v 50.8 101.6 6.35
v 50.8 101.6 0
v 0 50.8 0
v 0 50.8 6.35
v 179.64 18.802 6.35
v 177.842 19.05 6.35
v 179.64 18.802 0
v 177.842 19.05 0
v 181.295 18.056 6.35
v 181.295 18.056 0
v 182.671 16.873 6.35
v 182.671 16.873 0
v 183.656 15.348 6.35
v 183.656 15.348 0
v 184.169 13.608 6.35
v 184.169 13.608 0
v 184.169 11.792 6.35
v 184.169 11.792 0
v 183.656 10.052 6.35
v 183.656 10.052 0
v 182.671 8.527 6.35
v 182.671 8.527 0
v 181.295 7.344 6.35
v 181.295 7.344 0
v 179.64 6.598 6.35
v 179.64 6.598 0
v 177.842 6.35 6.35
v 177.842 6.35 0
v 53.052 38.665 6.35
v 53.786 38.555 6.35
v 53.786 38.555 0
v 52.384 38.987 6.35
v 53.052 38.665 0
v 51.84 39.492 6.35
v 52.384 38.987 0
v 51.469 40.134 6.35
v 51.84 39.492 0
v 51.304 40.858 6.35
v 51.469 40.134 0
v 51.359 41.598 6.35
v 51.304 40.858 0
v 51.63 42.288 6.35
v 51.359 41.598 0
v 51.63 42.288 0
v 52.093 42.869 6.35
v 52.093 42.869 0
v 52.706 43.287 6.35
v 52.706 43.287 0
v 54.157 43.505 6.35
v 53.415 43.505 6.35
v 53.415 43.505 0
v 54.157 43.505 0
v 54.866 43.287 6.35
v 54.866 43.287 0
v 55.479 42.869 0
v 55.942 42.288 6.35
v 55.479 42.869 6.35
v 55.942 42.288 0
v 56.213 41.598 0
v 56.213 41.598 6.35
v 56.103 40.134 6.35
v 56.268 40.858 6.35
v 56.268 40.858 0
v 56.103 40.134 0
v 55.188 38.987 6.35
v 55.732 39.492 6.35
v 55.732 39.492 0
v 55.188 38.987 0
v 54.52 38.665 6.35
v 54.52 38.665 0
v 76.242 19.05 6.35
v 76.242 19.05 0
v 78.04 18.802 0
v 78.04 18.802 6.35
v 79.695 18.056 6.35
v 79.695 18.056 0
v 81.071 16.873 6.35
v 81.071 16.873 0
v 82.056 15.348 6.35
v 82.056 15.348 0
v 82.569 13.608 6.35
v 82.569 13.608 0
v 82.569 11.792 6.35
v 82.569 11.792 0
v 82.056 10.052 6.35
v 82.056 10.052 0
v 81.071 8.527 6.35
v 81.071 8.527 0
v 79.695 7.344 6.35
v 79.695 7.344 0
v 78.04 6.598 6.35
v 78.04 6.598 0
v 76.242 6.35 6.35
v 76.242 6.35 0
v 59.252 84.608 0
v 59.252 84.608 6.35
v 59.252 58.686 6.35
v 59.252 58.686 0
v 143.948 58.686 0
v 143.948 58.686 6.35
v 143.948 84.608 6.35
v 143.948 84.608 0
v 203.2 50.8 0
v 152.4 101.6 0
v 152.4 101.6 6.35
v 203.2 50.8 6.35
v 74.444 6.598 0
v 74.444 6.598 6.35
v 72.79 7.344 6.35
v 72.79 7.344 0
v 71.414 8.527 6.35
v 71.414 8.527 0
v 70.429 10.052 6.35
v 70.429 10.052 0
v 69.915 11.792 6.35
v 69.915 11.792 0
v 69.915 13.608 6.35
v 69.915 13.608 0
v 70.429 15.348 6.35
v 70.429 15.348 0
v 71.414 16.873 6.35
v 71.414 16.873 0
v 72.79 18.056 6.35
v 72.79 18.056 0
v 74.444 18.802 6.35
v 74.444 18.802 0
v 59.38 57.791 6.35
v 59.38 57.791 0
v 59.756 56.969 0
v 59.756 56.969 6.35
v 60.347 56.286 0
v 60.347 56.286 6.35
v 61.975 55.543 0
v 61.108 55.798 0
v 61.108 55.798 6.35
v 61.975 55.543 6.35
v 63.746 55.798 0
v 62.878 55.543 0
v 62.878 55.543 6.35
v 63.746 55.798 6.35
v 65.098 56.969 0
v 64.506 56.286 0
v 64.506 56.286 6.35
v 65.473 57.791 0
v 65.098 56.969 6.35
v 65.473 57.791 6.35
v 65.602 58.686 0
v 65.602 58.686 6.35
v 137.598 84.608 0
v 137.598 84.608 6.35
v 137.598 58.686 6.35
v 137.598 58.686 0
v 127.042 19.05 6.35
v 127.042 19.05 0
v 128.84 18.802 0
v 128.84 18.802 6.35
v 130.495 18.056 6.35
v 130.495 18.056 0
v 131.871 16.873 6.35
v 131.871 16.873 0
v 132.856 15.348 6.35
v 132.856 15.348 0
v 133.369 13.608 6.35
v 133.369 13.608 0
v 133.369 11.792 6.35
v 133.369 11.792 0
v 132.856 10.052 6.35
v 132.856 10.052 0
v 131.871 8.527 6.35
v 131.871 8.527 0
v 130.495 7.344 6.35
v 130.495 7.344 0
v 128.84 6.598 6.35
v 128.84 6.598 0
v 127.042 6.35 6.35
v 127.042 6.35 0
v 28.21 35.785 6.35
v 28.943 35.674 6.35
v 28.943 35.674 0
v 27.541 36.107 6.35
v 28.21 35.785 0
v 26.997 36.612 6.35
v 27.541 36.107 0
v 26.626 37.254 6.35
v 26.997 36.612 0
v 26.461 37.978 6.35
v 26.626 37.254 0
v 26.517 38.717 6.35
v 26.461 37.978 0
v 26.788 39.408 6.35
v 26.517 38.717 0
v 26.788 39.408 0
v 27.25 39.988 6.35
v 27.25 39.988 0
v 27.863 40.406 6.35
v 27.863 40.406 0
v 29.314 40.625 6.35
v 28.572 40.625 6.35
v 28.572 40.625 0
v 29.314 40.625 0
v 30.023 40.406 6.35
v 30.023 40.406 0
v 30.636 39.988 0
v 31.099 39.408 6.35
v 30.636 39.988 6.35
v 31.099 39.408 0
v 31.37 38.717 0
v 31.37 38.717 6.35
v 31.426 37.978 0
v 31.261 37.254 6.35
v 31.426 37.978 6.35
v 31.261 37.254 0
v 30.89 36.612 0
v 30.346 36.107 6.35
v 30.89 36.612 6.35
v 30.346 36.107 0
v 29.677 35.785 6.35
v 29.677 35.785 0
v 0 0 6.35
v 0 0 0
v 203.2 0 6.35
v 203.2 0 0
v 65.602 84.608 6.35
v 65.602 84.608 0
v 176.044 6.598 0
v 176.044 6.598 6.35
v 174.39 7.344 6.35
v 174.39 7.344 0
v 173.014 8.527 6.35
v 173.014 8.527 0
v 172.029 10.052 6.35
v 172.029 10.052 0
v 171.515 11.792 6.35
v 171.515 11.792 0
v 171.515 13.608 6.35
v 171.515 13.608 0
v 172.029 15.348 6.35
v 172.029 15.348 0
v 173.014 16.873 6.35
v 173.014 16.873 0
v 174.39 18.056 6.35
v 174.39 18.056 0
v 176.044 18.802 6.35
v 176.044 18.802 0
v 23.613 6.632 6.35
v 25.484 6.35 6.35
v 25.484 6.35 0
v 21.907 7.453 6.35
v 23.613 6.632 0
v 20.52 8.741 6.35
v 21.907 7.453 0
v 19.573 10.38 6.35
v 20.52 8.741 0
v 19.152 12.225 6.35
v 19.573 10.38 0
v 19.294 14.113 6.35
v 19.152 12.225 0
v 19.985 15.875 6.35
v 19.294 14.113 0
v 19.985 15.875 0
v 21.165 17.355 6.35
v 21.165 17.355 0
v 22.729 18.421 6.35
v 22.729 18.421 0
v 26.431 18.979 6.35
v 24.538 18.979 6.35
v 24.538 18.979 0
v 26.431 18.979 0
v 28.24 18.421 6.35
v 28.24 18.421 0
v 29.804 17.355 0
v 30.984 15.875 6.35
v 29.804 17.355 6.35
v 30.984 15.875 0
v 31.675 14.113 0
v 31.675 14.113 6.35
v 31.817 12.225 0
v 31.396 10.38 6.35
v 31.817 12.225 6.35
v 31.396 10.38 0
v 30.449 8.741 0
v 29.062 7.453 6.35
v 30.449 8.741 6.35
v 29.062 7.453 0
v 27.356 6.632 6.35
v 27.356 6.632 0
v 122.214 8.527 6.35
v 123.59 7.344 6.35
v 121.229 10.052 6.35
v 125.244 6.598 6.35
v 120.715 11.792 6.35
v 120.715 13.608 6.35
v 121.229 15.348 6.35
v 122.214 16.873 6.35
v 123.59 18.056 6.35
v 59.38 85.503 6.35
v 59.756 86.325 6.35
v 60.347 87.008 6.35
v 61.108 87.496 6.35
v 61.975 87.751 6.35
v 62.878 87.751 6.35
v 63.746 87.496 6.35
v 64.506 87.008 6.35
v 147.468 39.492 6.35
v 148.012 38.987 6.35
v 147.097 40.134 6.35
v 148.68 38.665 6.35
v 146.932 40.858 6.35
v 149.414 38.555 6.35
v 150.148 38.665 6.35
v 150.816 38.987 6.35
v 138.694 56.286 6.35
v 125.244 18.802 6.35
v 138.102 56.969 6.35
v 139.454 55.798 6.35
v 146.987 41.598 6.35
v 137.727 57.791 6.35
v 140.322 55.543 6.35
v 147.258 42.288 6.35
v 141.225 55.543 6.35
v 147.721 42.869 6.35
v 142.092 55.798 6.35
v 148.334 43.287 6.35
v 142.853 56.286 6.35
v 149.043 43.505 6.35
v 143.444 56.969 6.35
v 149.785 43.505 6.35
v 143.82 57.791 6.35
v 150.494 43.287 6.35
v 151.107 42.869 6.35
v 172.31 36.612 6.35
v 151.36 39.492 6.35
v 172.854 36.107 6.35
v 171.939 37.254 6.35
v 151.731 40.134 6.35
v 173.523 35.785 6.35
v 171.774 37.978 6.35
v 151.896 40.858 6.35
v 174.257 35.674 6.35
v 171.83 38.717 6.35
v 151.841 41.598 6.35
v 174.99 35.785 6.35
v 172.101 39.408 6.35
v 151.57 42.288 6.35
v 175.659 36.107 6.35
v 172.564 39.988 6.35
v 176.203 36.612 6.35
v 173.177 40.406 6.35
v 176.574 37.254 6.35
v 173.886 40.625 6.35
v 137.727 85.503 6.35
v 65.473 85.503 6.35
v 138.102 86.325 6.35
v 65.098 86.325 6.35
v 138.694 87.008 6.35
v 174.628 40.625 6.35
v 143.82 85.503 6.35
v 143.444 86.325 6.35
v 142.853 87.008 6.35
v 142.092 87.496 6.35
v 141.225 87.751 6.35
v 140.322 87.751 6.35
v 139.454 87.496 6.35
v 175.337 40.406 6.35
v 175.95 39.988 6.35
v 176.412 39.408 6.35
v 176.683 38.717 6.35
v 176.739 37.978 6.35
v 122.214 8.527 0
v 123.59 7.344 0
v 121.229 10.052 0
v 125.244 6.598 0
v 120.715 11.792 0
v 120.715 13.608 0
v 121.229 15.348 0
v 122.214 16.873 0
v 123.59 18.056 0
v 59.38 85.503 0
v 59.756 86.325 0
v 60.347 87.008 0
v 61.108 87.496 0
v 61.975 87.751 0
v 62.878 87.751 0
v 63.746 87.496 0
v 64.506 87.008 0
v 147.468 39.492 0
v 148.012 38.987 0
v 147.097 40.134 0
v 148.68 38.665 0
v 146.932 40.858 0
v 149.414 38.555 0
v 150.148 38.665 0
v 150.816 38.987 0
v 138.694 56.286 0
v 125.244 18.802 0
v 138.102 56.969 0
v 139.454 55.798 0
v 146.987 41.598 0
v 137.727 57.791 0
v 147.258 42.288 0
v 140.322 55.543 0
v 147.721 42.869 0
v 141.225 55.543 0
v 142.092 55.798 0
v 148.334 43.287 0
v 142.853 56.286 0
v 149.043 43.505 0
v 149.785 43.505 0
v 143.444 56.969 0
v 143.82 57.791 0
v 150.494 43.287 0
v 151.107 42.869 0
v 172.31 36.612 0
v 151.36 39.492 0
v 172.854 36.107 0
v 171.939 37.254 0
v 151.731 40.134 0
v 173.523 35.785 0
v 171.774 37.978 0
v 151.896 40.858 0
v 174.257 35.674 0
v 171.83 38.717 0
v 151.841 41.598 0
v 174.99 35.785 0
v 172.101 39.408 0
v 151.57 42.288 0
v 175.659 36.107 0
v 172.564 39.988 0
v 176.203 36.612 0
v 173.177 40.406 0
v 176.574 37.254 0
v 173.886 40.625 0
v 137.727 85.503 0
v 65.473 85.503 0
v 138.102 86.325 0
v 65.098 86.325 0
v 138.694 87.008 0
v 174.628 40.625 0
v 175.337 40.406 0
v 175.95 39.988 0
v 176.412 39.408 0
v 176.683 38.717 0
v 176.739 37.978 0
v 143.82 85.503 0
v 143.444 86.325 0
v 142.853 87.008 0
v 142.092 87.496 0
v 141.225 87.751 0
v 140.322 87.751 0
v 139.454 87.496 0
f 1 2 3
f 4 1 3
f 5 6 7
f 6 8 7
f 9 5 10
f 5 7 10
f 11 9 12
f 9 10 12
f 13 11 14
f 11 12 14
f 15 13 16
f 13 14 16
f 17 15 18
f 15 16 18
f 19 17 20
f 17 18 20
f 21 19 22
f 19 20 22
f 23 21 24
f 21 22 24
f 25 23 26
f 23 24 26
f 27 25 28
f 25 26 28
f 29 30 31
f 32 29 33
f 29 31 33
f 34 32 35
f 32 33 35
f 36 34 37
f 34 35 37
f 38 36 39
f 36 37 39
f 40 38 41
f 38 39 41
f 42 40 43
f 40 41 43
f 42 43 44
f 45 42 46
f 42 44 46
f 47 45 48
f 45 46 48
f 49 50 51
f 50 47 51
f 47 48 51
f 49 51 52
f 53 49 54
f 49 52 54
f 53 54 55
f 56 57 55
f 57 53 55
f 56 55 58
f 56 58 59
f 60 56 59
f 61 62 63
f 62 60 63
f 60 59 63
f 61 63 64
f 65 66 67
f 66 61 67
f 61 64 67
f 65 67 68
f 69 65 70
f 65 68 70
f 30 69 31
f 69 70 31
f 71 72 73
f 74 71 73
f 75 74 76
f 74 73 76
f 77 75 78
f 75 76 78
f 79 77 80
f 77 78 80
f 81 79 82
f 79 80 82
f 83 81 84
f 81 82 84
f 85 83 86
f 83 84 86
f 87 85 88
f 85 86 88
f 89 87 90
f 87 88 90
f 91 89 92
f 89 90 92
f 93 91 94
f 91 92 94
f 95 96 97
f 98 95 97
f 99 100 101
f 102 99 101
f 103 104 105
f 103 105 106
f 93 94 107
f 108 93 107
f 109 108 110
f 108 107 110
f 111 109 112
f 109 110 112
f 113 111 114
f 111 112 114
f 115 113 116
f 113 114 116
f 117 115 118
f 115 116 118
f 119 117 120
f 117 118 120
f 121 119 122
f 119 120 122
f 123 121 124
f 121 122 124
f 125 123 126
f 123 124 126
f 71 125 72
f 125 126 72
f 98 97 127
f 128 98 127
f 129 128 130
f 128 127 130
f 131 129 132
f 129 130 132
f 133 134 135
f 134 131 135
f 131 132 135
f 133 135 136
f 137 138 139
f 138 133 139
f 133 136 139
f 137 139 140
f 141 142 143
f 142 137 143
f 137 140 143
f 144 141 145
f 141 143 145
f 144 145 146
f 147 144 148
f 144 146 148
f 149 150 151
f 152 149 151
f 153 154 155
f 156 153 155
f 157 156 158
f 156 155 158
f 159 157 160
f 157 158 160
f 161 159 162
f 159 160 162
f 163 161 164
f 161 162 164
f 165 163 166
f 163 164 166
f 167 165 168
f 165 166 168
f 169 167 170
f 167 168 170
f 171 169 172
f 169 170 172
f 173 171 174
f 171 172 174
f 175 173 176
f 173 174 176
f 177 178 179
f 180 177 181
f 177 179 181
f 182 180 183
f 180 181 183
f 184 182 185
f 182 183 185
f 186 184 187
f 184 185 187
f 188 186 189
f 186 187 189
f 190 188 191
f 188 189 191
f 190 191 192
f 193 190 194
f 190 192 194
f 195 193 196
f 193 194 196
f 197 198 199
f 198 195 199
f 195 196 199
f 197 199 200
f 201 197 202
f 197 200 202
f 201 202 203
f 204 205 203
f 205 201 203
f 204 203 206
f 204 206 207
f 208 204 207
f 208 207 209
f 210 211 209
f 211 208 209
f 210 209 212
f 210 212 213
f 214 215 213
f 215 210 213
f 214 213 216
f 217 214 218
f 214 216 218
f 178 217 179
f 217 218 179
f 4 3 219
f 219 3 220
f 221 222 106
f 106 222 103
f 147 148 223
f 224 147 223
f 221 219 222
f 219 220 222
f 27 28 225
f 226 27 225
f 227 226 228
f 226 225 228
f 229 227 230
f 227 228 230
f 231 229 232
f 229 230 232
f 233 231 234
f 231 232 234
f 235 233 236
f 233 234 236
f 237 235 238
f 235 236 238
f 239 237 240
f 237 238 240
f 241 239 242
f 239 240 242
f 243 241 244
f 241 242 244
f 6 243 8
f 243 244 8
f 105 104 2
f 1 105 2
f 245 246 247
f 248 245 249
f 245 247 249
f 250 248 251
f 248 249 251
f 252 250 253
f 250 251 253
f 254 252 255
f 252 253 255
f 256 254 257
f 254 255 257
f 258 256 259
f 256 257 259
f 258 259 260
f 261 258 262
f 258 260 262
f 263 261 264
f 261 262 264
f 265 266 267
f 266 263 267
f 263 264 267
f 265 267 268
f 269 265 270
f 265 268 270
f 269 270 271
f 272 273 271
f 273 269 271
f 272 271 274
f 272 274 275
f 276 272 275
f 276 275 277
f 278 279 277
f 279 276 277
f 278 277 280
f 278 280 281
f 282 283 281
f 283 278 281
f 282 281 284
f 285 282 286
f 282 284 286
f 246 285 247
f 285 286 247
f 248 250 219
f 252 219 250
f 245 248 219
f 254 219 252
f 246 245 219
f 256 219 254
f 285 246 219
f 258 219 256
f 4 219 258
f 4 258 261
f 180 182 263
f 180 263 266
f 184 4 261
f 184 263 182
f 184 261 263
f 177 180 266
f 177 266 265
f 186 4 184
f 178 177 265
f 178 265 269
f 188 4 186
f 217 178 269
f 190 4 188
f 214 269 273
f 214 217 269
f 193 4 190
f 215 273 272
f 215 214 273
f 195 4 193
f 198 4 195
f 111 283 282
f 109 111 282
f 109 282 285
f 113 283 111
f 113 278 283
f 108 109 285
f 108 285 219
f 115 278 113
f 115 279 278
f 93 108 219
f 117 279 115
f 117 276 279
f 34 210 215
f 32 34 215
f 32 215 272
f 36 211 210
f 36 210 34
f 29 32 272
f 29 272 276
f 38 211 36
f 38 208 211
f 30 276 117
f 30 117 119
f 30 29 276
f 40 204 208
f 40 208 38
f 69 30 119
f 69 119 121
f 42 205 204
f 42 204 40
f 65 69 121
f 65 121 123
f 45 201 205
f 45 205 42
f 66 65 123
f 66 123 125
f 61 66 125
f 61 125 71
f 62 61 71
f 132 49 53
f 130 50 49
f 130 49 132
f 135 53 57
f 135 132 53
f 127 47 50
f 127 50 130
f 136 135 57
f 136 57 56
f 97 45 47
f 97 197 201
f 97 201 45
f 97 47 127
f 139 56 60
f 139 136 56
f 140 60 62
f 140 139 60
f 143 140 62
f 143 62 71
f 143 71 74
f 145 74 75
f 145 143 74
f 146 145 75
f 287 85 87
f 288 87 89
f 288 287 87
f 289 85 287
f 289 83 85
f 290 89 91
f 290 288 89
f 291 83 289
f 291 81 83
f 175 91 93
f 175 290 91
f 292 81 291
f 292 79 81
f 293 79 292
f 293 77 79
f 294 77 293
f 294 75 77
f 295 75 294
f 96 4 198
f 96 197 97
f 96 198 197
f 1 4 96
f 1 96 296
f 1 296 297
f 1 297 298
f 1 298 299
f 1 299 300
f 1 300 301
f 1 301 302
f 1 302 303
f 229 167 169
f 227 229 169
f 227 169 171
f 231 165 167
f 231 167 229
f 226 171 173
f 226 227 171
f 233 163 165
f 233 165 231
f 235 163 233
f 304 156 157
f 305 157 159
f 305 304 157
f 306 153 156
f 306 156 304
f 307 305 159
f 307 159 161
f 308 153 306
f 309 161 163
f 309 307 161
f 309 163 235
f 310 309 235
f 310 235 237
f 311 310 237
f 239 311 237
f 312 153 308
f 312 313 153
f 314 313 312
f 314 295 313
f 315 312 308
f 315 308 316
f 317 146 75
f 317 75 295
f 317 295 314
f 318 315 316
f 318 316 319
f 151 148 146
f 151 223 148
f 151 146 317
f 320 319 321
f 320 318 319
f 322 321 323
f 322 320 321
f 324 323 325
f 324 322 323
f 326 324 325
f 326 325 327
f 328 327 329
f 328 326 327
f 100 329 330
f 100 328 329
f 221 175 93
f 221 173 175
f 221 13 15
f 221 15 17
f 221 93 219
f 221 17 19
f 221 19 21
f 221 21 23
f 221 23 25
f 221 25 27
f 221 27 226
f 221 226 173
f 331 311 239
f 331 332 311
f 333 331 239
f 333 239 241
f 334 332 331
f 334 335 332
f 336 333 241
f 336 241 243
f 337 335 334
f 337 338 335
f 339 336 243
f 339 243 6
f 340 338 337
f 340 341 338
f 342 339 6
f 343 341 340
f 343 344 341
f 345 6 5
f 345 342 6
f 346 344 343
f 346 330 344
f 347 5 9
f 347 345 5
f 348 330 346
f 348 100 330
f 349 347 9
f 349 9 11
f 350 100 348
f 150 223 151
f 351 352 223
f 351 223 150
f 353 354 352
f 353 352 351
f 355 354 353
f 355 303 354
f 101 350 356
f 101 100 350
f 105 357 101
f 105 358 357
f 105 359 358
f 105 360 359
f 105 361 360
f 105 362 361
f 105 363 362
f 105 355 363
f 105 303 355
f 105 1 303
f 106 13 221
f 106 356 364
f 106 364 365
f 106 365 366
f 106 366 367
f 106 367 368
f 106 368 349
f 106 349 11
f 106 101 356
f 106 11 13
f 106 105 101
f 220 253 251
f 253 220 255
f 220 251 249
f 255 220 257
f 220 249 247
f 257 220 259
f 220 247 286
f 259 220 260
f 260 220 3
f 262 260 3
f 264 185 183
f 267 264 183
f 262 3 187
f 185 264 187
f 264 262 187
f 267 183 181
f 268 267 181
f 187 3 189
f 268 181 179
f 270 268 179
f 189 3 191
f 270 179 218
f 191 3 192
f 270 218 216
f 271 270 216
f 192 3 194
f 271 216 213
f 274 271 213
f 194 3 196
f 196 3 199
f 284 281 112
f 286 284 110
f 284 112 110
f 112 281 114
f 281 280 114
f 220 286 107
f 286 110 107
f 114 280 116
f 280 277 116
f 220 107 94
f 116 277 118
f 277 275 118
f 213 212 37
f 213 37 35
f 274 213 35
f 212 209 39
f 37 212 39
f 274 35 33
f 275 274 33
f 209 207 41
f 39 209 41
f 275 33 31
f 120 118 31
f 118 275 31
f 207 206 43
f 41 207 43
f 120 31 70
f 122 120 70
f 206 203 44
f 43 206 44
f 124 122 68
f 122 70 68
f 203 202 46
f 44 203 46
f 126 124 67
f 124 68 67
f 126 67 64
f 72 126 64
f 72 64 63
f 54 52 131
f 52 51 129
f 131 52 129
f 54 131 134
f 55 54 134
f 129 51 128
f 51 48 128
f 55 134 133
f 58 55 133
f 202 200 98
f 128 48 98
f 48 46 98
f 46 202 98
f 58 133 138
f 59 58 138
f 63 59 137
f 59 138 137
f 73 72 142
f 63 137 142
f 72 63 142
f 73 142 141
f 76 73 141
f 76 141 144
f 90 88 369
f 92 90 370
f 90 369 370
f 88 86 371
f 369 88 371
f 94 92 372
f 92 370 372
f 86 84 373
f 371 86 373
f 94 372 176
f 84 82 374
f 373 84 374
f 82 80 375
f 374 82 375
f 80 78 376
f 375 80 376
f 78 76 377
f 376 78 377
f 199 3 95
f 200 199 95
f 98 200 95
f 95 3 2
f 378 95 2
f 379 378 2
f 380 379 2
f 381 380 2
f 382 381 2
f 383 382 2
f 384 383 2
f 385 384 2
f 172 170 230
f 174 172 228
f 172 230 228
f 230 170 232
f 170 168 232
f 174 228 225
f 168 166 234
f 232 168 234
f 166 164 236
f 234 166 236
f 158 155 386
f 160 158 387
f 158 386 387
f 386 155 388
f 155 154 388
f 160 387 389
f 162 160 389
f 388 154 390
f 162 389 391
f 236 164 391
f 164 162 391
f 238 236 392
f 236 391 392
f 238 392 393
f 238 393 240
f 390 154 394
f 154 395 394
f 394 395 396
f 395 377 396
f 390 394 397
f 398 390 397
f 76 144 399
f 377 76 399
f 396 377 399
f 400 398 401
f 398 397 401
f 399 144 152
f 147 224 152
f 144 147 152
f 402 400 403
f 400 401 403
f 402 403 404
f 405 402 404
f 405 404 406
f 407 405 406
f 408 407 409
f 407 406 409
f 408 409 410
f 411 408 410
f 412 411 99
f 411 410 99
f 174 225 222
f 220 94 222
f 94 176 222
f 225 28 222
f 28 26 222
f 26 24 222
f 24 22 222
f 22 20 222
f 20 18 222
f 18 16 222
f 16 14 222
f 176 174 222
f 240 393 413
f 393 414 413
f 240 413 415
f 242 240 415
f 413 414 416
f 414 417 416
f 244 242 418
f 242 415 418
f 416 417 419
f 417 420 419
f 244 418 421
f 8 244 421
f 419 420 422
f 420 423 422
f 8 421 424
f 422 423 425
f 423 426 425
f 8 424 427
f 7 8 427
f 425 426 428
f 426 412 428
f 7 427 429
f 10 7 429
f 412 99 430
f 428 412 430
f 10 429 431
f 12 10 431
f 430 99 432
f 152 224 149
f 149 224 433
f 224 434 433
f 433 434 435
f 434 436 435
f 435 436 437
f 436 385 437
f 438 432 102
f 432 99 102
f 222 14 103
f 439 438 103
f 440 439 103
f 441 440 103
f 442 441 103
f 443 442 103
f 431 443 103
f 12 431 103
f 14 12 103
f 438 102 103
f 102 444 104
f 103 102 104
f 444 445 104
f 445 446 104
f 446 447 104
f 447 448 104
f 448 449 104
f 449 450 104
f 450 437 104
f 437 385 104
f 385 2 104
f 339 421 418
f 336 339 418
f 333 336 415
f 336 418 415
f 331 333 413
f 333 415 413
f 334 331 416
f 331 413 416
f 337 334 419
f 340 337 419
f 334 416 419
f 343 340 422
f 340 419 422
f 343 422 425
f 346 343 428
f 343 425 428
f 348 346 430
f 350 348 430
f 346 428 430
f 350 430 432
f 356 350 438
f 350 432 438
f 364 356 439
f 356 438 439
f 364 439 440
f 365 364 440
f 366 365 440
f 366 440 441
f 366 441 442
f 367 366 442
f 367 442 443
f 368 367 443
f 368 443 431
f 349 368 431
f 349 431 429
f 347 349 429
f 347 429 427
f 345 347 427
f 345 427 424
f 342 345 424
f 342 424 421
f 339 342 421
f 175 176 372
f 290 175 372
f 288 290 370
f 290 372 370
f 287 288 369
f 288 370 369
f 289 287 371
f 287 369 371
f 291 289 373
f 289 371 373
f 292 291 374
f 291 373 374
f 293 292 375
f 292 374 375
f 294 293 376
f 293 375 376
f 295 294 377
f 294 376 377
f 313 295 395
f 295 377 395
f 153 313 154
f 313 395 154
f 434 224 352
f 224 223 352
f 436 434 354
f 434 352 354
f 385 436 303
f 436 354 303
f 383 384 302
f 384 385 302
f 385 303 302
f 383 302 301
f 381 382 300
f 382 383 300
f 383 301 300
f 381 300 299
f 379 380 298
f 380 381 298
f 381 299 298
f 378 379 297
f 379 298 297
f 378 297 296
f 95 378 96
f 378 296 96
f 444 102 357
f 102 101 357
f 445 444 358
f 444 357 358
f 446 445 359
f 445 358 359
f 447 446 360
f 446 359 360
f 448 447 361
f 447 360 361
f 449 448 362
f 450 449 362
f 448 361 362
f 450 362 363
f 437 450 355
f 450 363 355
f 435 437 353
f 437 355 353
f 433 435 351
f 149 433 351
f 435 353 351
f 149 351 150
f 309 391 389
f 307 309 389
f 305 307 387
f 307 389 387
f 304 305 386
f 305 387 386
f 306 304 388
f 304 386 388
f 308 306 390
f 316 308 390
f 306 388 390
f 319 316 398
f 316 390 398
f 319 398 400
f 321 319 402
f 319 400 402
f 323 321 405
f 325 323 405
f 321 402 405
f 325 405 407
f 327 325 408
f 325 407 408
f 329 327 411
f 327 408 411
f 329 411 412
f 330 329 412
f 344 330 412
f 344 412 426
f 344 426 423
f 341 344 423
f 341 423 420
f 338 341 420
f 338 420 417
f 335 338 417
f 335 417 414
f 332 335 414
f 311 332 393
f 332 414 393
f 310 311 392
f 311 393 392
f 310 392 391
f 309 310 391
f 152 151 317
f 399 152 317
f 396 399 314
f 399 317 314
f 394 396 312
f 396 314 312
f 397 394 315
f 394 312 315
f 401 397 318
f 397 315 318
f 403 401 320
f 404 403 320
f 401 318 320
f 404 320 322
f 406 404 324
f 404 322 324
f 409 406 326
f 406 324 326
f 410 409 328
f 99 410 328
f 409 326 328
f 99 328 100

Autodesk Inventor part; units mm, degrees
ref_plane "XZ Plane" through (0, 0, 0) normal (0, 1, 0) x (-1, 0, 0)
ref_plane "XY Plane" through (0, 0, 0) normal (0, 0, 1) x (1, 0, 0)
sketch "Sketch1" plane through (0, 0, 0) normal (0, 0, 1) x (1, 0, 0)
  line L0 (0, 0) -> (203.2, 0)
  line L1 (203.2, 0) -> (203.2, 50.8)
  line L2 (152.4, 101.6) -> (50.8, 101.6)
  line L3 (0, 50.8) -> (0, 0)
  line L4 (50.8, 101.6) -> (0, 50.8)
  line L5 (152.4, 101.6) -> (203.2, 50.8)
  point P0 (203.2, 101.6)
  point P1 (0, 101.6)
  dimension "d0" = 50.8
  dimension "d1" = 50.8
  dimension "d2" = 50.8
  dimension "d3" = 50.8
  dimension "d7" = 203.2
  dimension "d8" = 101.6
extrude "Extrusion1" add sketch "Sketch1" along normal blind 6.35
sketch "Sketch2" plane through (0, 0, 6.35) normal (0, 0, 1) x (1, 0, 0)
  line L0 (0, 0) -> (203.2, 0) projected
  line L1 (0, 0) -> (203.2, 0) projected
  line L2 (203.2, 0) -> (203.2, 50.8) projected
  line L3 (203.2, 50.8) -> (152.4, 101.6) projected
  line L4 (152.4, 101.6) -> (50.8, 101.6) projected
  line L5 (50.8, 101.6) -> (0, 50.8) projected
  line L6 (0, 50.8) -> (0, 0) projected
  point P0 (25.4, 12.7)
  point P1 (76.1155, 12.7)
  dimension "d6" = 12.7
  dimension "d9" = 25.4
hole "Hole1" at (25.4, 12.7, 6.35) at (76.1155, 12.7, 6.35) direction (0, 0, -1) diameter 12.7 depth 25.4 tip angle 118
pattern_linear "Rectangular Pattern1" count 4 spacing 50.8 along (1, 0, 0) of "Hole1" first direction both ways yes
sketch "Sketch3" plane through (0, 0, 6.35) normal (0, 0, 1) x (1, 0, 0)
  line L0 (0, 0) -> (203.2, 0) projected
  line L1 (203.2, 0) -> (203.2, 50.8) projected
  line L2 (203.2, 50.8) -> (152.4, 101.6) projected
  line L3 (152.4, 101.6) -> (50.8, 101.6) projected
  line L4 (50.8, 101.6) -> (0, 50.8) projected
  line L5 (0, 50.8) -> (0, 0) projected
  arc A0 (76.1577, 6.3501) -> (76.1577, 19.0499) centre (76.2, 12.7) ccw projected
  arc A1 (76.1577, 19.0499) -> (76.1577, 6.3501) centre (76.1155, 12.7) ccw projected
  circle A2 centre (177.7155, 12.7) radius 6.35 projected
  arc A3 (126.9577, 6.3501) -> (126.9577, 19.0499) centre (127, 12.7) ccw projected
  arc A4 (126.9577, 19.0499) -> (126.9577, 6.3501) centre (126.9155, 12.7) ccw projected
  arc A5 (25.3577, 19.0499) -> (25.3577, 6.3501) centre (25.3155, 12.7) ccw projected
  arc A6 (25.3577, 6.3501) -> (25.3577, 19.0499) centre (25.4, 12.7) ccw projected
  line L6 (140.7734, 84.608) -> (140.7734, 58.6856) construction
  line L7 (152.4, 101.6) -> (50.8, 101.6) projected
  line L8 (137.5984, 84.608) -> (137.5984, 58.6856)
  line L9 (143.9484, 58.6856) -> (143.9484, 84.608)
  arc A7 (143.9484, 84.608) -> (137.5984, 84.608) centre (140.7734, 84.608) ccw
  arc A8 (137.5984, 58.6856) -> (143.9484, 58.6856) centre (140.7734, 58.6856) ccw
  point P0 (140.7734, 71.6468)
  point P1 (174.2566, 38.1636)
  point P2 (149.4142, 41.0439)
  dimension "d20" = 6.35
hole "Hole2" at (174.2566, 38.1636, 6.35) at (149.4142, 41.0439, 6.35) direction (0, 0, -1) diameter 4.9784 depth 19.05 tip angle 118 thread size "1/4-20 UNC" class "2B" standard "ANSI Unified Screw Threads"
extrude "Extrusion2" cut sketch "Sketch3" against normal blind 6.35 contours A7 L9 A8 L8
sketch "Sketch4" plane through (0, 0, 0) normal (0, 0, -1) x (-1, 0, 0)
  arc A0 (-143.9484, 58.6856) -> (-137.5984, 58.6856) centre (-140.7734, 58.6856) ccw projected
  line L0 (-143.9484, 58.6856) -> (-143.9484, 84.608) projected
  arc A1 (-137.5984, 84.608) -> (-143.9484, 84.608) centre (-140.7734, 84.608) ccw projected
  line L1 (-137.5984, 84.608) -> (-137.5984, 58.6856) projected
  circle A2 centre (-174.2566, 38.1636) radius 2.4892 projected
  circle A3 centre (-149.4142, 41.0439) radius 2.4892 projected
  line L2 (0, 0) -> (-203.2, 0) projected
  line L3 (0, 50.8) -> (0, 0) projected
  line L4 (-50.8, 101.6) -> (0, 50.8) projected
  line L5 (-152.4, 101.6) -> (-50.8, 101.6) projected
  line L6 (-203.2, 50.8) -> (-152.4, 101.6) projected
  line L7 (-203.2, 0) -> (-203.2, 50.8) projected
  arc A4 (-25.3577, 6.3501) -> (-25.3577, 19.0499) centre (-25.3155, 12.7) ccw projected
  arc A5 (-25.3577, 19.0499) -> (-25.3577, 6.3501) centre (-25.4, 12.7) ccw projected
  circle A6 centre (-177.7155, 12.7) radius 6.35 projected
  arc A7 (-126.9577, 19.0499) -> (-126.9577, 6.3501) centre (-127, 12.7) ccw projected
  arc A8 (-126.9577, 6.3501) -> (-126.9577, 19.0499) centre (-126.9155, 12.7) ccw projected
  arc A9 (-76.1577, 19.0499) -> (-76.1577, 6.3501) centre (-76.2, 12.7) ccw projected
  arc A10 (-76.1577, 6.3501) -> (-76.1577, 19.0499) centre (-76.1155, 12.7) ccw projected
  line L8 (-152.4, 101.6) -> (-50.8, 101.6) projected
  line L9 (-101.6, 101.6) -> (-101.6, 0)
  line L10 (0, 0) -> (-203.2, 0) projected
ref_plane "Work Plane1" through (101.6, 101.6, 0) normal (1, 0, 0) x (0, -1, 0)
mirror "Mirror1" about plane through (101.6, 101.6, 0) normal (1, 0, 0) of "Extrusion2", "Hole2"
mirror "Mirror2" about plane through (101.6, 101.6, 0) normal (1, 0, 0) of "Extrusion1", "Extrusion2", "Hole2", "Mirror1", "Hole1", "Rectangular Pattern1"
sketch "Sketch5" plane through (0, 0, 0) normal (0, 0, -1) x (-1, 0, 0)
  line L0 (-91.0569, 50.3137) -> (-46.6879, 50.3137) construction
  line L1 (-46.6879, 50.3137) -> (-46.6879, 47.0459) construction
  line L2 (-46.6879, 47.0459) -> (-91.0569, 47.0459) construction
  line L3 (-91.0569, 47.0459) -> (-91.0569, 50.3137) construction
  point P0 (0, 0)
equation "\"d1\" = d0"
equation "\"d3\" = d2"
properties part number "junk" material "Water"
